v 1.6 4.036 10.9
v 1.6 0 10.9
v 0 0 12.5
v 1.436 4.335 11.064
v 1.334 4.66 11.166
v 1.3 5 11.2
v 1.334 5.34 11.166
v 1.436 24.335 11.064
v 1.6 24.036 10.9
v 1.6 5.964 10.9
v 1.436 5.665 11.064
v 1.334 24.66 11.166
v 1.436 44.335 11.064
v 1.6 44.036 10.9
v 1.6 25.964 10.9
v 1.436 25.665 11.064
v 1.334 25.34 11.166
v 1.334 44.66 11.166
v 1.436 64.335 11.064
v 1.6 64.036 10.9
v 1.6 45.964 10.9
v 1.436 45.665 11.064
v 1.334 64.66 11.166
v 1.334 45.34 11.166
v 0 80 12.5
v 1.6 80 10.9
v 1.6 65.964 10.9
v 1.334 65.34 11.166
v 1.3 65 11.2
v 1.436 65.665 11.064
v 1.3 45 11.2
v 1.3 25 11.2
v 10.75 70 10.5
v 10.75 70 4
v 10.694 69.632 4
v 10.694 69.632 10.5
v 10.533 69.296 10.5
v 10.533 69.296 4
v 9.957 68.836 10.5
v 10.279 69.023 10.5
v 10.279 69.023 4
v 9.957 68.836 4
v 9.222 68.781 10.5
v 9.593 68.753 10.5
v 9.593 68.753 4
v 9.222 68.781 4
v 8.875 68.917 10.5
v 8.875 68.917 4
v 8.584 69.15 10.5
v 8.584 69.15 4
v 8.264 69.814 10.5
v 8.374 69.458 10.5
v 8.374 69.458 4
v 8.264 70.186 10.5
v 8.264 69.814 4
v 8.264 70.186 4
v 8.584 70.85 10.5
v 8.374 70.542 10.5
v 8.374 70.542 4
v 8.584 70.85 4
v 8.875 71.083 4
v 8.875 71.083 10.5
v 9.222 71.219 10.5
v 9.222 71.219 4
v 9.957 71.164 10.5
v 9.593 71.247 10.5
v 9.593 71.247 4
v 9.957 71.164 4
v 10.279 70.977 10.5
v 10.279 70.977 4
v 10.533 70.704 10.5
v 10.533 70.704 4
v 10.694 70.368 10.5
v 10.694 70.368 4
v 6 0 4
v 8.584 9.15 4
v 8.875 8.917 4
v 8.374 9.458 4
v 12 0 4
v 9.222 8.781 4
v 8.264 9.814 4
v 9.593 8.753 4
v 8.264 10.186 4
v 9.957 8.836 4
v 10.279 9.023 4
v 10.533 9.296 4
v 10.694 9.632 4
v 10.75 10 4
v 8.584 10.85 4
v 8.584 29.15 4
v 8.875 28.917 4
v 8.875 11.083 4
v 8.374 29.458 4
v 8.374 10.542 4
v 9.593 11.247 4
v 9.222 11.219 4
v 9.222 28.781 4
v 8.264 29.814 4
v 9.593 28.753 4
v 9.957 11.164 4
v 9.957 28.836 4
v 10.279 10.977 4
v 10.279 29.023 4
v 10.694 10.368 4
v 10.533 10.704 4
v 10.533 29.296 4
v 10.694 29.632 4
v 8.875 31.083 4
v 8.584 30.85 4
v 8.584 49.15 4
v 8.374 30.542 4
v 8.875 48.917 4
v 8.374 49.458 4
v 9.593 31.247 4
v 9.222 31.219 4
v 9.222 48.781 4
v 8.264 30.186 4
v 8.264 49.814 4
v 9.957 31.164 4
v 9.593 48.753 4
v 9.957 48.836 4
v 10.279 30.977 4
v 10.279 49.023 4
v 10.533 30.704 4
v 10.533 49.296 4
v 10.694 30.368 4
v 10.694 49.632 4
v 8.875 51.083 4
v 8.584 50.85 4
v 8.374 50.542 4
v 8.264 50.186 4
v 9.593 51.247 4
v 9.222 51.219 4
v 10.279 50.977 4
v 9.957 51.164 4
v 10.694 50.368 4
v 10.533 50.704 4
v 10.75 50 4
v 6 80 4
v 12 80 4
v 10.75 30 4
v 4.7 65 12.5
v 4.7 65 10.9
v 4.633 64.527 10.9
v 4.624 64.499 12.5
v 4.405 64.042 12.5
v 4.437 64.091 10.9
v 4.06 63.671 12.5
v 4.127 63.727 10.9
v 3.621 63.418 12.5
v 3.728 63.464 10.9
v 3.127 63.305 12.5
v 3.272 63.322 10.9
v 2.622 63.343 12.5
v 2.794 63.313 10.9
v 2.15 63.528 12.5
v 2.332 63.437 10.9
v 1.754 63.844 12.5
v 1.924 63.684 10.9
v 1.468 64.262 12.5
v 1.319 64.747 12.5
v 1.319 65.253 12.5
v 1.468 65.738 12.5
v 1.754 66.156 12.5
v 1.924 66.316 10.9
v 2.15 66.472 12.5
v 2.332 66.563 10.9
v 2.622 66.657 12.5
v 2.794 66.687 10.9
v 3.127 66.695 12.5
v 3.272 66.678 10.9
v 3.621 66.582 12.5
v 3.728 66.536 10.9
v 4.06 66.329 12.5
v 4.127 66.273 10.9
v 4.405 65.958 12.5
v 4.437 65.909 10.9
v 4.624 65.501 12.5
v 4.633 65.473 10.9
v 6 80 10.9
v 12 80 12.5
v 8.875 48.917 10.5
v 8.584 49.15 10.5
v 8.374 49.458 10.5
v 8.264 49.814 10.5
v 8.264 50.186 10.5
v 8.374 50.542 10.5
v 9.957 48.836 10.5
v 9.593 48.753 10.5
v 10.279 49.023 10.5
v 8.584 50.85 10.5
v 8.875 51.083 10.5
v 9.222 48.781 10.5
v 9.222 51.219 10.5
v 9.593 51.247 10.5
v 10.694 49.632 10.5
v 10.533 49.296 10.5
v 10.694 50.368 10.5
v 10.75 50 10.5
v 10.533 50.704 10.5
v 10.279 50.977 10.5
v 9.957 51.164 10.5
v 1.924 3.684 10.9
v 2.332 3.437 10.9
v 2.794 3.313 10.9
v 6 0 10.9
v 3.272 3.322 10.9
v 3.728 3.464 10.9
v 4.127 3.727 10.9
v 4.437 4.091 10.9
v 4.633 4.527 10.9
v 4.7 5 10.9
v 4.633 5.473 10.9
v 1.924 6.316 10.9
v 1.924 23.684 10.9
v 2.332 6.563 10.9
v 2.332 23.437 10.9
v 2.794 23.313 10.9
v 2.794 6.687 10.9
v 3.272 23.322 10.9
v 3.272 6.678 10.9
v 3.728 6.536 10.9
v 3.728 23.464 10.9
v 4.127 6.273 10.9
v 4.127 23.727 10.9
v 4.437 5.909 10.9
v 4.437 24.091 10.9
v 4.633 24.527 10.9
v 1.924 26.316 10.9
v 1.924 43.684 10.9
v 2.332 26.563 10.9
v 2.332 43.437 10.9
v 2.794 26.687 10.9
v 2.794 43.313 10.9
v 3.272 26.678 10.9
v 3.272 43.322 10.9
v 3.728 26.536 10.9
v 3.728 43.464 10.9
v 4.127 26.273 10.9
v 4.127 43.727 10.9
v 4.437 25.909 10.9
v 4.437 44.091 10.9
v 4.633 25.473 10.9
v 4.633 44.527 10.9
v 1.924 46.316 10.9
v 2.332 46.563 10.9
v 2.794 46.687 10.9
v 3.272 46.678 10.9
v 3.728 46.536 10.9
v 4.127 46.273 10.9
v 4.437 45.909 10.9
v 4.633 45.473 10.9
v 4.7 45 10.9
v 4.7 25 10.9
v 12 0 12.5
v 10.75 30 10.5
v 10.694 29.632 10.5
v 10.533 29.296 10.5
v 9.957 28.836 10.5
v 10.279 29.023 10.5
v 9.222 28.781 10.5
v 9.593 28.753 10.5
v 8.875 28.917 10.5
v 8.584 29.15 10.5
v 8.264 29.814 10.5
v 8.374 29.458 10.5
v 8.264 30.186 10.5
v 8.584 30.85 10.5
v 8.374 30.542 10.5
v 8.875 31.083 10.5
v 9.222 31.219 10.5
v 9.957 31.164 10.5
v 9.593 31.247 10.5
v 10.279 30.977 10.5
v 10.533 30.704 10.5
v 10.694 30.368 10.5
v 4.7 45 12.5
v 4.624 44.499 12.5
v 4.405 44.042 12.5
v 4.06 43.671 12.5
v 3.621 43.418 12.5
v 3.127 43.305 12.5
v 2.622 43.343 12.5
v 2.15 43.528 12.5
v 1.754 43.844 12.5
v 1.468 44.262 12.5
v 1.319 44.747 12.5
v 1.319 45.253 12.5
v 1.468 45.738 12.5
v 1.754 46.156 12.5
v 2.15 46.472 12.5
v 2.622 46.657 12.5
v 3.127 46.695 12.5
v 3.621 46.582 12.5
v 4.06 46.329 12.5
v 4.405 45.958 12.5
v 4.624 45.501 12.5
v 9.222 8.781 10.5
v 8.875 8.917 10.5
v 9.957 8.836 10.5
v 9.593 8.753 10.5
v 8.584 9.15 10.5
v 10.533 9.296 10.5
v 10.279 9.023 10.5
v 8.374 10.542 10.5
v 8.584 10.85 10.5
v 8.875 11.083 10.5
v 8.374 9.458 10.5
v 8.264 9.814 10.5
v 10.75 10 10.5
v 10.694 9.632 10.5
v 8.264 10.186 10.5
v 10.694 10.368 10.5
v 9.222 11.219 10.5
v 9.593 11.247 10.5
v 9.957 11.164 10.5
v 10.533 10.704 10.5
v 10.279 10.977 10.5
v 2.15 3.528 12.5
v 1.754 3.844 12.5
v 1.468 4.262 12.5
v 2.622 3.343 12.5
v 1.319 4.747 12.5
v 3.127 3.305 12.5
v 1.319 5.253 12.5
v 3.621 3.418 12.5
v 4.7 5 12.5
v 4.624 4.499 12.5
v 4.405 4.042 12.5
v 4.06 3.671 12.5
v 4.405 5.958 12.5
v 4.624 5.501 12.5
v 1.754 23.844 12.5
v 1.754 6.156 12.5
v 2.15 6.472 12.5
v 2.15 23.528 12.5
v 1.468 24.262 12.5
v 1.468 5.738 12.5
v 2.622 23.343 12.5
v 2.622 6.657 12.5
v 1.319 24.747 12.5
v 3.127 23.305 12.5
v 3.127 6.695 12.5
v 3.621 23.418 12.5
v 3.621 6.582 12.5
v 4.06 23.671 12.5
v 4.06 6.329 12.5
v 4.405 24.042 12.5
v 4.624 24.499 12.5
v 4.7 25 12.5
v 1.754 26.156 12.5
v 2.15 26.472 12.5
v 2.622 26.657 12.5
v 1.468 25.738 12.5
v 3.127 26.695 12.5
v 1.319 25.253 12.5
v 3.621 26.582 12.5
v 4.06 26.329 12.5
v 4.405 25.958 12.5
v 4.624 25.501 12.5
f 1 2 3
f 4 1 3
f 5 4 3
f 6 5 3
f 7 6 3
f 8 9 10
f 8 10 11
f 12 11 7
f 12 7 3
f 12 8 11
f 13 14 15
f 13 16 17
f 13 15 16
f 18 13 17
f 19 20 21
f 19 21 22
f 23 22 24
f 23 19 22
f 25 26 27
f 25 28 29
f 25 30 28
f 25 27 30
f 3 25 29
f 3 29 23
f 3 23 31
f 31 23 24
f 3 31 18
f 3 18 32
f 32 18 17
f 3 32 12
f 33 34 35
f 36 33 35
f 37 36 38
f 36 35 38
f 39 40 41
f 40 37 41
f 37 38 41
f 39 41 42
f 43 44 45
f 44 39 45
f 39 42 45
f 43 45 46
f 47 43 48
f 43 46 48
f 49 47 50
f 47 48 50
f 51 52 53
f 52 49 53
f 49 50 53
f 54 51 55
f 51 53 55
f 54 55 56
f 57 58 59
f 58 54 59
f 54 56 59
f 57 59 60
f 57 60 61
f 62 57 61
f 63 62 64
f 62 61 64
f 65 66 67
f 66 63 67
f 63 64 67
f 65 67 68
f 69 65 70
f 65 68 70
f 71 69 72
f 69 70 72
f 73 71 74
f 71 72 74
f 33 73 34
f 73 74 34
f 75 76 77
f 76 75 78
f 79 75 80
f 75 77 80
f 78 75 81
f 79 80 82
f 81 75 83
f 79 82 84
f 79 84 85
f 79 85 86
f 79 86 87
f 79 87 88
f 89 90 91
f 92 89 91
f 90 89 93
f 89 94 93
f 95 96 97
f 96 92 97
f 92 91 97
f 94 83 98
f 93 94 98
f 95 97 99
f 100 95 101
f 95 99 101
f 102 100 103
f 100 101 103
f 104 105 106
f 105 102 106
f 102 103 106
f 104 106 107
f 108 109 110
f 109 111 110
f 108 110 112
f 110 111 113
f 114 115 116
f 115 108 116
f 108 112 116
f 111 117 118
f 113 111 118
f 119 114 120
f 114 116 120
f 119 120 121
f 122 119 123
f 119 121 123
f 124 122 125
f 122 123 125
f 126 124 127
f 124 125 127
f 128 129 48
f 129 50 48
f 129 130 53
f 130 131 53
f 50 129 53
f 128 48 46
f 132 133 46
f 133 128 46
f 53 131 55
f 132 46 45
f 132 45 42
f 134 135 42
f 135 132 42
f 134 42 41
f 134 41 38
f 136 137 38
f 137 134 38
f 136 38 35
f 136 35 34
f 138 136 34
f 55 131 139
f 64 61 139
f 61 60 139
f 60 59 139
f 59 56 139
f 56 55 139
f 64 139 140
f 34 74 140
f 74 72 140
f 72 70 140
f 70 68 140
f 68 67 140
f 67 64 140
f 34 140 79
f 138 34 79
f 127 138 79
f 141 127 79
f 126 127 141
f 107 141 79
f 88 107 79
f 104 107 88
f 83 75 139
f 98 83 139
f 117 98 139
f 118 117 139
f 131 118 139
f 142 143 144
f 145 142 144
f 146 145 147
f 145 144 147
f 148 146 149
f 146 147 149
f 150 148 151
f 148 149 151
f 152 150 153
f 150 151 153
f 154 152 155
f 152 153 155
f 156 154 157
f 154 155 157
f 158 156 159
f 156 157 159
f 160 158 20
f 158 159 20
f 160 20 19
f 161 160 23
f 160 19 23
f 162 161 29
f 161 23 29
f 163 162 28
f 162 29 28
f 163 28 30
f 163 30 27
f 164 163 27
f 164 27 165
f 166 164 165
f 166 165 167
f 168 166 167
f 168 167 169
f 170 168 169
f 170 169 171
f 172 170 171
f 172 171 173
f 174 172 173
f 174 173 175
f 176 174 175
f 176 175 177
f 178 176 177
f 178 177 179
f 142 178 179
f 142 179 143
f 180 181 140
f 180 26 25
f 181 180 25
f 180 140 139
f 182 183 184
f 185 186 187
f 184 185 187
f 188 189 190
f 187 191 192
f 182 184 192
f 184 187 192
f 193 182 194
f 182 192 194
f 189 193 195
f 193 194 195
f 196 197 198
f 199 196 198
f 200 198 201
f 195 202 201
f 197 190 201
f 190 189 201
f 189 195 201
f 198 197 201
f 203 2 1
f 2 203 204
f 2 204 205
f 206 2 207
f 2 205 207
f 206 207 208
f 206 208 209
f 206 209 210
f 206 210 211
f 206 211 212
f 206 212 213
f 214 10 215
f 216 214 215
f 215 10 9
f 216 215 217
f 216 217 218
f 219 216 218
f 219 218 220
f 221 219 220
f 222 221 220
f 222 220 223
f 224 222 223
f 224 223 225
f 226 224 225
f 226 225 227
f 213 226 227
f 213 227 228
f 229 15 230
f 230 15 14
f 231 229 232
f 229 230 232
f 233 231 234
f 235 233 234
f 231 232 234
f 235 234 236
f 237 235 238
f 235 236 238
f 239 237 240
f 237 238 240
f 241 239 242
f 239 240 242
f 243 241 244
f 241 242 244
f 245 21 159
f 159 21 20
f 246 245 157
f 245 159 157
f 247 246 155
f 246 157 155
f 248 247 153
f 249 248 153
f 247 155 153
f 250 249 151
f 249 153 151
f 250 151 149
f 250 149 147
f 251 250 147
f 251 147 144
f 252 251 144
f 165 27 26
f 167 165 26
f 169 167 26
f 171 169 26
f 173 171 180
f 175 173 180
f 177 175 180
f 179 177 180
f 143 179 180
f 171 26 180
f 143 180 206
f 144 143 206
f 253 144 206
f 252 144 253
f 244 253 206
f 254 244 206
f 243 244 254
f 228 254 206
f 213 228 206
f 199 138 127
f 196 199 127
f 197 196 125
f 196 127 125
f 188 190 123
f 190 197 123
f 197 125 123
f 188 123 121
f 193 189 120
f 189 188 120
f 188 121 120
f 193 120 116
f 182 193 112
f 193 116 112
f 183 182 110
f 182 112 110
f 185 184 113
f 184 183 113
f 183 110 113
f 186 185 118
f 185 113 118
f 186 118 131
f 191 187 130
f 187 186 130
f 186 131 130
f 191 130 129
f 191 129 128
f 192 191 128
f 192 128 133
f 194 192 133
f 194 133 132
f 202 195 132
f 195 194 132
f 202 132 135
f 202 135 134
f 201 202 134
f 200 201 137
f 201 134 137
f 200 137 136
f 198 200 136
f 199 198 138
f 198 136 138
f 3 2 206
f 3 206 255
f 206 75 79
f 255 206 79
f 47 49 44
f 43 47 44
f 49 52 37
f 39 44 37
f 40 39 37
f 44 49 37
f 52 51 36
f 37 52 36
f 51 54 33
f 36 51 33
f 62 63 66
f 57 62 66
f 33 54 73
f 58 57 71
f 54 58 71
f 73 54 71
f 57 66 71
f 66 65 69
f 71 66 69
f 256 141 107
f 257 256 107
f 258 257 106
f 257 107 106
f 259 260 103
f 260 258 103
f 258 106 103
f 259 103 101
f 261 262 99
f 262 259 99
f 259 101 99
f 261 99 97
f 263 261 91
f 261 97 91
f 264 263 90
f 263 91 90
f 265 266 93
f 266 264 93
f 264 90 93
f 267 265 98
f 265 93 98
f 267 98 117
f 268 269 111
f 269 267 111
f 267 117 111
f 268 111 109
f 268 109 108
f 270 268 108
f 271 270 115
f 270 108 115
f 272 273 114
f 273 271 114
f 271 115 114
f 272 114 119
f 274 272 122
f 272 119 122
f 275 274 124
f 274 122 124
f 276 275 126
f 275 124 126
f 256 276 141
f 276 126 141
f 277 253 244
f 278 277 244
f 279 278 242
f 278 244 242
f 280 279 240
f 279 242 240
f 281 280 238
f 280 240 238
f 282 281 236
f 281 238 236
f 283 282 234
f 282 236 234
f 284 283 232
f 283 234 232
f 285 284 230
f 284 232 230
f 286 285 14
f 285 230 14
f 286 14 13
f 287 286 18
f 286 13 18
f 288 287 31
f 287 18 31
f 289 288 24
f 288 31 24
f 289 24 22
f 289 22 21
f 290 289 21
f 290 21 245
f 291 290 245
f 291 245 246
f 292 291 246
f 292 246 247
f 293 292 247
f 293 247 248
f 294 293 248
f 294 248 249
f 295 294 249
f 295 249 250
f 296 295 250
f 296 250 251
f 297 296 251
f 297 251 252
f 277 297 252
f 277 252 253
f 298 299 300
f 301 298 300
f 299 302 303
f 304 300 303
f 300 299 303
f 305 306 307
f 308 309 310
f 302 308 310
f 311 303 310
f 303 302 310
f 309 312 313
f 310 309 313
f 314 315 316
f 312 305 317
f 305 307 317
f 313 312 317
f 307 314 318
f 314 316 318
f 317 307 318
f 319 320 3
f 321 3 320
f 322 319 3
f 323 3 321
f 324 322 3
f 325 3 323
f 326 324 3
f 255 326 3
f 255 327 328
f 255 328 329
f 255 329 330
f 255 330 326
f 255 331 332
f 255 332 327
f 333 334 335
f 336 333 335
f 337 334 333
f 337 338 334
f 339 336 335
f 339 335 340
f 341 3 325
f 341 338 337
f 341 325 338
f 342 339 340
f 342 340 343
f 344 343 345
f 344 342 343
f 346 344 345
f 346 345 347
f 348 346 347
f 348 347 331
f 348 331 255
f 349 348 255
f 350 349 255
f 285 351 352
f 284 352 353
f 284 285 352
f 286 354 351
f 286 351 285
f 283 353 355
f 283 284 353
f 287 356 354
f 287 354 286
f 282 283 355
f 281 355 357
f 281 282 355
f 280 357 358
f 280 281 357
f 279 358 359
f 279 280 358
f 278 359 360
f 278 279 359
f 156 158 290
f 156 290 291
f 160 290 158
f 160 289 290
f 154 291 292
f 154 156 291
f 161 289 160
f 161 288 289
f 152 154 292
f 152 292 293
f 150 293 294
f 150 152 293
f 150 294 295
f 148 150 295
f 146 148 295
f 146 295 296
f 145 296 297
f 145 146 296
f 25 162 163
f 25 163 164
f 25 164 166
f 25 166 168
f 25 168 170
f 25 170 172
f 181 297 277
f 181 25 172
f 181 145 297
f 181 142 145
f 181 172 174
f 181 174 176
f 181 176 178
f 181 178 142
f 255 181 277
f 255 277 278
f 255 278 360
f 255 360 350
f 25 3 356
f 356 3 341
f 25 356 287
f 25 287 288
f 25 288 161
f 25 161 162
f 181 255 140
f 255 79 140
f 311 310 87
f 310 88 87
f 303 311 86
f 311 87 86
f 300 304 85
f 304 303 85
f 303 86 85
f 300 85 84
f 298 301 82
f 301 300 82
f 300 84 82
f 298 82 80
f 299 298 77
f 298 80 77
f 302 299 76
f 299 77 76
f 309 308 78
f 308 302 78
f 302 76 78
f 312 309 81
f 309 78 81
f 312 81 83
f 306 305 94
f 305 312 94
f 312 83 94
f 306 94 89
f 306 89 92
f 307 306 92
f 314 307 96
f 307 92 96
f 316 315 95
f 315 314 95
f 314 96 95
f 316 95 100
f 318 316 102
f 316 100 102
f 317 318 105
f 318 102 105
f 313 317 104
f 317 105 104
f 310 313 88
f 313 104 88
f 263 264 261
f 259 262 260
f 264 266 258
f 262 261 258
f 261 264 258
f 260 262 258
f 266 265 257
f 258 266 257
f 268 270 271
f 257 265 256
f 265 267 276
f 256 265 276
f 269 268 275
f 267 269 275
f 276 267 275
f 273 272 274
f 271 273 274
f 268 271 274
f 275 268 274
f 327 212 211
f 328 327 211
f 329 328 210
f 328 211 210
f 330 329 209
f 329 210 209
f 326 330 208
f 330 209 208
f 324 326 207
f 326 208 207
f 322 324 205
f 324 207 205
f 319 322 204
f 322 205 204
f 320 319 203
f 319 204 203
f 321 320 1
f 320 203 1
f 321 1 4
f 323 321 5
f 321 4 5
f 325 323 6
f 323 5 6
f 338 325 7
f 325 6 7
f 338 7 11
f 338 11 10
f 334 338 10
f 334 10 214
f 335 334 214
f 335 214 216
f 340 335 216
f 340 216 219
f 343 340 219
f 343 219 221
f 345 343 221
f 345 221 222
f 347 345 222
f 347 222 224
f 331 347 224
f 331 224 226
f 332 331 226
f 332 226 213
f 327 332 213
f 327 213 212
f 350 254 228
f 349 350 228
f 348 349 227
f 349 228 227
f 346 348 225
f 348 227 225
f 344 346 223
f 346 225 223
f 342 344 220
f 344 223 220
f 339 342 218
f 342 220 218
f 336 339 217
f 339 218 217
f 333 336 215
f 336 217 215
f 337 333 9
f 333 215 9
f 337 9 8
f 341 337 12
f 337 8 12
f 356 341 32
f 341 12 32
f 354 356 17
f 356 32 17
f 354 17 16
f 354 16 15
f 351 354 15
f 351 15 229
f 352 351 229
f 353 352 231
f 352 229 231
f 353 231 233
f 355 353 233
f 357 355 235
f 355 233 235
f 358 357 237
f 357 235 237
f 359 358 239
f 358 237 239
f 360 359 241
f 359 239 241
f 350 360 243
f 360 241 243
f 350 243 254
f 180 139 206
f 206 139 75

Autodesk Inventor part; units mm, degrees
ref_plane "Left_Connecting_Web_StartPlane" through (0, 0, 4) normal (0, 0, 1) x (1, 0, 0)
sketch "Left_Connecting_Web_Profile" plane through (0, 0, 4) normal (0, 0, 1) x (1, 0, 0)
  line L0 (6, 0) -> (12, 0)
  line L1 (12, 0) -> (12, 80)
  line L2 (12, 80) -> (6, 80)
  line L3 (6, 80) -> (6, 0)
  point P0 (0, 0)
  dimension "d1" = 6
  dimension "d2" = 6
  dimension "d3" = 80
extrude "Left_Connecting_Web" add sketch "Left_Connecting_Web_Profile" along normal blind 8.5
ref_plane "Left_Rod_Contact_Flange_StartPlane" through (0, 0, 10.9) normal (0, 0, 1) x (1, 0, 0)
sketch "Left_Rod_Contact_Flange_Profile" plane through (0, 0, 10.9) normal (0, 0, 1) x (1, 0, 0)
  line L0 (0, 0) -> (12, 0)
  line L1 (12, 0) -> (12, 80)
  line L2 (12, 80) -> (0, 80)
  line L3 (0, 80) -> (0, 0)
  dimension "d7" = 12
  dimension "d8" = 80
extrude "Left_Rod_Contact_Flange" add sketch "Left_Rod_Contact_Flange_Profile" along normal blind 1.6
sketch "Original_Rod_Clearance_4x_Locations" plane through (0, 0, 0) normal (0, 0, 1) x (1, 0, 0)
  circle A0 centre (3, 5) radius 1.7
  circle A1 centre (3, 25) radius 1.7
  circle A2 centre (3, 45) radius 1.7
  circle A3 centre (3, 65) radius 1.7
  point P0 (0, 0)
  dimension "d11" = 3
  dimension "d12" = 5
  dimension "d13" = 3.4
  dimension "d14" = 3
  dimension "d15" = 25
  dimension "d16" = 3.4
  dimension "d17" = 3
  dimension "d18" = 45
  dimension "d19" = 3.4
  dimension "d20" = 3
  dimension "d21" = 65
  dimension "d22" = 3.4
extrude "Original_Rod_Clearance_4x" cut sketch "Original_Rod_Clearance_4x_Locations" along normal through all
ref_plane "Work Plane3" through (0, 0, 4) normal (0, 0, 1) x (1, 0, 0)
sketch "Deck_Assembly_M3_Locations" plane through (0, 0, 4) normal (0, 0, 1) x (1, 0, 0)
  circle A0 centre (9.5, 10) radius 1.25
  circle A1 centre (9.5, 30) radius 1.25
  circle A2 centre (9.5, 50) radius 1.25
  circle A3 centre (9.5, 70) radius 1.25
  point P0 (0, 0)
  dimension "d26" = 9.5
  dimension "d27" = 10
  dimension "d28" = 2.5
  dimension "d29" = 9.5
  dimension "d30" = 30
  dimension "d31" = 2.5
  dimension "d32" = 9.5
  dimension "d33" = 50
  dimension "d34" = 2.5
  dimension "d35" = 9.5
  dimension "d36" = 70
  dimension "d37" = 2.5
extrude "Four_Blind_M3_Tap_Bores" cut sketch "Deck_Assembly_M3_Locations" along normal blind 6.5
thread "Deck_M3x0_5_6H_1" size "M3x0.5" class "6H" standard "ISO Metric profile" length 6.5
thread "Deck_M3x0_5_6H_2" size "M3x0.5" class "6H" standard "ISO Metric profile" length 6.5
thread "Deck_M3x0_5_6H_3" size "M3x0.5" class "6H" standard "ISO Metric profile" length 6.5
thread "Deck_M3x0_5_6H_4" size "M3x0.5" class "6H" standard "ISO Metric profile" length 6.5
chamfer "Outer_End_1p6mm_45deg" distance 1.6 angle 45 1 edges at (0, 40, 10.9)
equation "\"d1\" = RodWidth"
equation "\"d2\" = WebThickness"
equation "\"d3\" = ContactLength"
equation "\"d4\" = DropHeight"
equation "\"d7\" = RodWidth + WebThickness"
equation "\"d8\" = ContactLength"
equation "\"d9\" = RodFlangeThickness"
equation "\"d11\" = 0.5 * RodWidth"
equation "\"d12\" = RodHoleStart + 0 * RodScrewPitch"
equation "\"d13\" = RodClearanceDiameter"
equation "\"d14\" = 0.5 * RodWidth"
equation "\"d15\" = RodHoleStart + RodScrewPitch"
equation "\"d16\" = RodClearanceDiameter"
equation "\"d17\" = 0.5 * RodWidth"
equation "\"d18\" = RodHoleStart + 2 * RodScrewPitch"
equation "\"d19\" = RodClearanceDiameter"
equation "\"d20\" = 0.5 * RodWidth"
equation "\"d21\" = RodHoleStart + 3 * RodScrewPitch"
equation "\"d22\" = RodClearanceDiameter"
equation "\"d26\" = JoinLeftX"
equation "\"d27\" = JoinFirstY + 0 * JoinPitch"
equation "\"d28\" = TapDrillDiameter"
equation "\"d29\" = JoinLeftX"
equation "\"d30\" = JoinFirstY + JoinPitch"
equation "\"d31\" = TapDrillDiameter"
equation "\"d32\" = JoinLeftX"
equation "\"d33\" = JoinFirstY + 2 * JoinPitch"
equation "\"d34\" = TapDrillDiameter"
equation "\"d35\" = JoinLeftX"
equation "\"d36\" = JoinFirstY + 3 * JoinPitch"
equation "\"d37\" = TapDrillDiameter"
equation "\"d38\" = JoinThreadDepth"
equation "\"d40\" = JoinThreadDepth"
equation "\"d42\" = JoinThreadDepth"
equation "\"d44\" = JoinThreadDepth"
equation "\"d46\" = JoinThreadDepth"
equation "\"d48\" = OuterEndChamfer"
equation "\"d49\" = OuterEndChamfer"
equation "\"OverallWidth\" = 51"
equation "\"RodWidth\" = 6"
equation "\"ContactLength\" = 80"
equation "\"BaseThickness\" = 4"
equation "\"DropHeight\" = 8.5"
equation "\"WebThickness\" = 6"
equation "\"FingerStartX\" = 19.93338"
equation "\"FingerWidth\" = 13.5"
equation "\"FingerThickness\" = 6"
equation "\"FingerEndInset\" = 4"
equation "\"RodClearanceDiameter\" = 3.4"
equation "\"ClampFirstY\" = 41.82802"
equation "\"ClampPitch\" = 16"
equation "\"ClampHeight\" = BaseThickness + 0.5 * FingerThickness"
equation "\"TapDrillDiameter\" = 2.5"
equation "\"TapDepth\" = 6"
equation "\"RodHoleStart\" = 5"
equation "\"RodScrewPitch\" = 20"
equation "\"JoinLeftX\" = 9.5"
equation "\"JoinFirstY\" = 10"
equation "\"JoinPitch\" = 20"
equation "\"JoinThreadDepth\" = 6.5"
equation "\"JoinCountersinkDiameter\" = 6.2"
equation "\"d0\" = BaseThickness"
equation "\"d6\" = BaseThickness + DropHeight - RodFlangeThickness"
equation "\"d25\" = BaseThickness"
equation "\"RodFlangeThickness\" = 1.6"
equation "\"OuterEndChamfer\" = RodFlangeThickness"
properties part number "Left_Rod_Support"
